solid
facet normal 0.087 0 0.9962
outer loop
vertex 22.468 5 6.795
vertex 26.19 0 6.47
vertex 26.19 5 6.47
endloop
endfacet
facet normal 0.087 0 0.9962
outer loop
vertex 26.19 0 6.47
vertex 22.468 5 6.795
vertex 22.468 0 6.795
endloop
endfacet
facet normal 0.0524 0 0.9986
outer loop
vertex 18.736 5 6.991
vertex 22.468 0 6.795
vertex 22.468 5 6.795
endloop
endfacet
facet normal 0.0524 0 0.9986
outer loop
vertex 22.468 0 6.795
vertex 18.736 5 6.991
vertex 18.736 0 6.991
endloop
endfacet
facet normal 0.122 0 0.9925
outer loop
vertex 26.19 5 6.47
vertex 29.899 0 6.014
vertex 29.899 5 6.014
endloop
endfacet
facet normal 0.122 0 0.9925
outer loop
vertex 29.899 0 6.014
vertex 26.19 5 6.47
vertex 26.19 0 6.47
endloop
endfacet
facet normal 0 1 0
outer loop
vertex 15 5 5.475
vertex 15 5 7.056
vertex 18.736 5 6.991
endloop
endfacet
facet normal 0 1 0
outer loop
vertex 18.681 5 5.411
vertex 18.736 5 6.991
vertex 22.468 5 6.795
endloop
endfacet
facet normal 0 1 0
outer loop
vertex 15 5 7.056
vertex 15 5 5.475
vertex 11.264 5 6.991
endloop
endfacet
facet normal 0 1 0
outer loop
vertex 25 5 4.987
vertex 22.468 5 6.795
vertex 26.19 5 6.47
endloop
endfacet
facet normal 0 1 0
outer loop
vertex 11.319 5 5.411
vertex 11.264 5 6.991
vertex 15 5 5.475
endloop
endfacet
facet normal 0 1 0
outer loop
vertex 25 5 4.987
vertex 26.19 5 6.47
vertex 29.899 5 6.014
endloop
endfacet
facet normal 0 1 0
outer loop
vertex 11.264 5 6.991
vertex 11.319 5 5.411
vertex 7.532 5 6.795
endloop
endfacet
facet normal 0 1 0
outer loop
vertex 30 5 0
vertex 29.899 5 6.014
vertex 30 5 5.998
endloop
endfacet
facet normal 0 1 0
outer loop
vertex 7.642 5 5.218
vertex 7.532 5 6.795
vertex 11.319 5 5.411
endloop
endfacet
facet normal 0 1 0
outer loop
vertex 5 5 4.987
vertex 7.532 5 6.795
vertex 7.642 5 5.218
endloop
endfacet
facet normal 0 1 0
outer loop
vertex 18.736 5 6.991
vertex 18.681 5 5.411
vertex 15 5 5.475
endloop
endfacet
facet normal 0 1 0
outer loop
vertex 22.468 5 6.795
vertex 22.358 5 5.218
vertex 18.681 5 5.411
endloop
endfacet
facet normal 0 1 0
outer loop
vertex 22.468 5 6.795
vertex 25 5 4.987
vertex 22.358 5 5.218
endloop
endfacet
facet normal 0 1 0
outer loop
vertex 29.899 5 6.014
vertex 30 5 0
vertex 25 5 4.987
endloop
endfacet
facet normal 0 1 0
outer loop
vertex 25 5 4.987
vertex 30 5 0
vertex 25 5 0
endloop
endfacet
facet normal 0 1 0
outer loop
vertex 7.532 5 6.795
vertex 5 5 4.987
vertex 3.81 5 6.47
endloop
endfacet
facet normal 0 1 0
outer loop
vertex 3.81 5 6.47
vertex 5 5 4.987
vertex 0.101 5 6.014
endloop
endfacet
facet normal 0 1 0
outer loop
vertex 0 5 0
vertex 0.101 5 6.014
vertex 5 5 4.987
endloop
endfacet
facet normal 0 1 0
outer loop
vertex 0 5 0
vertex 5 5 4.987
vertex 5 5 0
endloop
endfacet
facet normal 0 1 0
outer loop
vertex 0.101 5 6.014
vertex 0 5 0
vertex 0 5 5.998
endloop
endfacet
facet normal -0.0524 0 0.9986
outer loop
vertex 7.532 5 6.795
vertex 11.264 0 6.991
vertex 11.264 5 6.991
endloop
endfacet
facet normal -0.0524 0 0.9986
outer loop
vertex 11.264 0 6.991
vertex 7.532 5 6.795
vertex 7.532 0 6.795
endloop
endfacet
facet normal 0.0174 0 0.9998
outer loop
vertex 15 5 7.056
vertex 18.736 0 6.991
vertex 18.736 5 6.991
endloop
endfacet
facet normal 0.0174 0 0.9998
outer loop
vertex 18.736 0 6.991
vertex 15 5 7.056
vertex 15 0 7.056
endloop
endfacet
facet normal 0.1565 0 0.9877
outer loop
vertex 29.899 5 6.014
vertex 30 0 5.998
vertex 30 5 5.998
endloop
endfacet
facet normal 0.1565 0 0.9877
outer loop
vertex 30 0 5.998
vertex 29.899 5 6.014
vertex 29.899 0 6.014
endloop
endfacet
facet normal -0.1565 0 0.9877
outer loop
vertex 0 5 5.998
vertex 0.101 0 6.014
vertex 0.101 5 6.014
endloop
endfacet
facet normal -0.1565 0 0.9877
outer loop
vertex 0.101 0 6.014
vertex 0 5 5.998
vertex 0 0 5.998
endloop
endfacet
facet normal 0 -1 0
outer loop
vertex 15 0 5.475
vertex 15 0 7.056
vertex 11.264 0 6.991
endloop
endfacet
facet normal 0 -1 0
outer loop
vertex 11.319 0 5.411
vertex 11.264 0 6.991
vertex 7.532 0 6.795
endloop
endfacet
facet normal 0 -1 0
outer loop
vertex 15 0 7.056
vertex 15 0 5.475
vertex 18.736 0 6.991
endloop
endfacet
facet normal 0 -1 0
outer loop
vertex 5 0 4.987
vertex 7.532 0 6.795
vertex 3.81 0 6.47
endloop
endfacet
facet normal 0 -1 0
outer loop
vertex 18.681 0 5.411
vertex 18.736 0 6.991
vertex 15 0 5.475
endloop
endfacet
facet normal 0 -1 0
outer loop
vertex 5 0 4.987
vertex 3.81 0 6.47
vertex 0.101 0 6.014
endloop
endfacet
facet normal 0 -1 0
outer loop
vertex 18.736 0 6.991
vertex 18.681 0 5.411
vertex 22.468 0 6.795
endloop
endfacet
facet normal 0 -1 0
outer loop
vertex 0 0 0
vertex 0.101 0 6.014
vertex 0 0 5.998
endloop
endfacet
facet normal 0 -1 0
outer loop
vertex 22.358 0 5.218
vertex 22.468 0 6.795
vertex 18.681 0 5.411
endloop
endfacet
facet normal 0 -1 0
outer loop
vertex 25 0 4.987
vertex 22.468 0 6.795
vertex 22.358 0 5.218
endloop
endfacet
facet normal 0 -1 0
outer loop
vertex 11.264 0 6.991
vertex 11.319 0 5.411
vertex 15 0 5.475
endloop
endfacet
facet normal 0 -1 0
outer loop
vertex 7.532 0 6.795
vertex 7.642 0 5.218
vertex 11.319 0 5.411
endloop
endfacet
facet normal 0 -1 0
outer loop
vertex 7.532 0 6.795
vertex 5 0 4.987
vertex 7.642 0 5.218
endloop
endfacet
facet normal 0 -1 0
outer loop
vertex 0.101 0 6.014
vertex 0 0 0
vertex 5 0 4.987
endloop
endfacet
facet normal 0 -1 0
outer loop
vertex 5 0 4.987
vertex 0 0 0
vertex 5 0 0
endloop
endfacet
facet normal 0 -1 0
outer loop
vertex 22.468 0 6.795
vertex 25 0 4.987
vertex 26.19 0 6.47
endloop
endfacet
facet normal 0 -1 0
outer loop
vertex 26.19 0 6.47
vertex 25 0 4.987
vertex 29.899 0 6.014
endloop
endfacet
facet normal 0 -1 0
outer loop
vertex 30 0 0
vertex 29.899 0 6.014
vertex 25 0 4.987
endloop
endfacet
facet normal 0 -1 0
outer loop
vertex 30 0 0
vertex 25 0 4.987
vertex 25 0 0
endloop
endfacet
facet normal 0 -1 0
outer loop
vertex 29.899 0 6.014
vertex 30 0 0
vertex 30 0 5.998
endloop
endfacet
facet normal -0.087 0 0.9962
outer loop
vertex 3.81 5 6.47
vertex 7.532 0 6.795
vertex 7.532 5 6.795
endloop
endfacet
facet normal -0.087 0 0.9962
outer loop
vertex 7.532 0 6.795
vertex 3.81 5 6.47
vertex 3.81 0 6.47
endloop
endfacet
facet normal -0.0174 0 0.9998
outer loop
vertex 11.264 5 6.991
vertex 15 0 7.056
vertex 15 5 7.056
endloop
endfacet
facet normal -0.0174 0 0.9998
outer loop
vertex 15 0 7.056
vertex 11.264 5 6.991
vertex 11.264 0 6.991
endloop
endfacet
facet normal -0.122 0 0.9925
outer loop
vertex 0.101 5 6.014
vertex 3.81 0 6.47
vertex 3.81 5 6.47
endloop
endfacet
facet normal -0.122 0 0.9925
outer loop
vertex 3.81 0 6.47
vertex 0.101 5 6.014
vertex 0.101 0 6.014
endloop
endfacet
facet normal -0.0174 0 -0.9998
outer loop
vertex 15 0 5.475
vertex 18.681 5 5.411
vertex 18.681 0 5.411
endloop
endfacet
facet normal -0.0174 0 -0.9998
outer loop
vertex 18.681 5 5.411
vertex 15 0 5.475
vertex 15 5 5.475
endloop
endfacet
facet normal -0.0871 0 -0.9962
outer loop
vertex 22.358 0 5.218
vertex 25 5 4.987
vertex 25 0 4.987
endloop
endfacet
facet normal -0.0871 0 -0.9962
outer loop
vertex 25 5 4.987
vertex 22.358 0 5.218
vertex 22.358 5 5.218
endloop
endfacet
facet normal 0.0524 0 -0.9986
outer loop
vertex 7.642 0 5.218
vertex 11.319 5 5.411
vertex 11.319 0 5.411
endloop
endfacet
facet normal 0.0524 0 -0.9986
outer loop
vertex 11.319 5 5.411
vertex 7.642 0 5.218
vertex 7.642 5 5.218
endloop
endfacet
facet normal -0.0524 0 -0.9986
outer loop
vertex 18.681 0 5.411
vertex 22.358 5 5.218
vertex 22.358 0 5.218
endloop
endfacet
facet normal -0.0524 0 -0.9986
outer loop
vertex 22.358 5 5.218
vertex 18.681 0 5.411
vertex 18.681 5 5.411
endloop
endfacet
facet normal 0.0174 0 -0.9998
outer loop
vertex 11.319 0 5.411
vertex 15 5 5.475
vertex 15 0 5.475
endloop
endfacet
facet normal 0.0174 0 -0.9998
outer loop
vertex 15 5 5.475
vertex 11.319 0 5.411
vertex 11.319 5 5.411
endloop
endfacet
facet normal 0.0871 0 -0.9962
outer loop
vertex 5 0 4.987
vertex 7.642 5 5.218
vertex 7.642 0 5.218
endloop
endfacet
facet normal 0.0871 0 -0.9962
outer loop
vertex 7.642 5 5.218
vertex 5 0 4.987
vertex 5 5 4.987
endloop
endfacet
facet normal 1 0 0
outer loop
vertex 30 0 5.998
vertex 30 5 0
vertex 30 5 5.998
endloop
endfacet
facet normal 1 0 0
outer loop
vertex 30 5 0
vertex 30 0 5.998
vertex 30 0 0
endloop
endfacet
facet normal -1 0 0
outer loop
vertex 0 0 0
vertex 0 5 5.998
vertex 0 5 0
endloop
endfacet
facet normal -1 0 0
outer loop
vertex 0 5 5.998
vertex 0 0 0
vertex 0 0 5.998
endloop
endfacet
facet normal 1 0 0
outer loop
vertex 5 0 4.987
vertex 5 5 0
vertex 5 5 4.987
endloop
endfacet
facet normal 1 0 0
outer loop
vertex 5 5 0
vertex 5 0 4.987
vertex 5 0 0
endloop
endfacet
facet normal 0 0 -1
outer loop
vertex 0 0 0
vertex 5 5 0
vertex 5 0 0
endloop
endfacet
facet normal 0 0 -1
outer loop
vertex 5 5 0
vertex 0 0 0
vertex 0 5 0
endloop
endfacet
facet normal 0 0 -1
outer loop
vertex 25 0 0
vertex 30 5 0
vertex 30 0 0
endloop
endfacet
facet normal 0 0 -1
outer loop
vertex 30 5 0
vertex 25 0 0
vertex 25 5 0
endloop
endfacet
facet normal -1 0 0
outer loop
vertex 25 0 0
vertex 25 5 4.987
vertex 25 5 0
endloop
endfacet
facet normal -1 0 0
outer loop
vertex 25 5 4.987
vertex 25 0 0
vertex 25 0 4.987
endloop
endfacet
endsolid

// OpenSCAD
distance = 20;
size = 5;
ring_depth = 100;
minimum_ring_thickness = 1;
$fn = 180;

cube(size);
translate([size + distance, 0, 0])
	cube(size);

intersection() {
	translate([size + distance / 2, 0, -ring_depth]) {
		rotate([-90, 0, 0]) {
			difference() {
				cylinder(r = sqrt(pow(ring_depth + size + minimum_ring_thickness, 2) + pow(distance / 2 + size, 2)), h = size);
				cylinder(r = sqrt(pow(ring_depth + size, 2) + pow(distance / 2, 2)), h = size);
			}
		}
	}
	cube([size * 2 + distance, size, size + distance]);
}
